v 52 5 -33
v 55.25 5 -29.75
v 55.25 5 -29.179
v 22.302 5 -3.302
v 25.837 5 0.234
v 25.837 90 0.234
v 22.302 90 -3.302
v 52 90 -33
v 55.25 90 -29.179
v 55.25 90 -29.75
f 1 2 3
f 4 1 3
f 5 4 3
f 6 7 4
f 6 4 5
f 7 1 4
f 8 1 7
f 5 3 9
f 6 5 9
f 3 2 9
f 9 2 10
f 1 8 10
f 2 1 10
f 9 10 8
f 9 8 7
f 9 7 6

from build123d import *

# Parameters (mm, degrees)
BOX011_W               = 10
BOX011_H               = 86
BOX011_DEPTH           = 10
BOX006_W               = 5
BOX006_H               = 85
BOX006_DEPTH           = 42
BOX006_PLACEMENT_ANGLE = 315


with BuildPart() as cube011:
    # Box011 → Box011 (new body)
    with BuildSketch(Plane(origin=(55.25, 5, -33), x_dir=(1, 0, 0), z_dir=(0, 0, 1))):
        with Locations((5, 43)):
            Rectangle(BOX011_W, BOX011_H)
    extrude(amount=BOX011_DEPTH)


with BuildPart() as cut006:
    # Box006 → Box006 (new body)
    with BuildSketch(Plane.XY):
        with Locations((2.5, 42.5)):
            Rectangle(BOX006_W, BOX006_H)
    extrude(amount=BOX006_DEPTH)


with BuildPart() as cut006_1:
    # Box006 placement: moved
    add(cut006.part.moved(Location((52, 5, -33))).rotate(Axis((52, 5, -33), (0, 1, 0)), BOX006_PLACEMENT_ANGLE))

    # Cut006: cut Cube011
    add(cube011.part, mode=Mode.SUBTRACT)


solid = cut006_1.part
